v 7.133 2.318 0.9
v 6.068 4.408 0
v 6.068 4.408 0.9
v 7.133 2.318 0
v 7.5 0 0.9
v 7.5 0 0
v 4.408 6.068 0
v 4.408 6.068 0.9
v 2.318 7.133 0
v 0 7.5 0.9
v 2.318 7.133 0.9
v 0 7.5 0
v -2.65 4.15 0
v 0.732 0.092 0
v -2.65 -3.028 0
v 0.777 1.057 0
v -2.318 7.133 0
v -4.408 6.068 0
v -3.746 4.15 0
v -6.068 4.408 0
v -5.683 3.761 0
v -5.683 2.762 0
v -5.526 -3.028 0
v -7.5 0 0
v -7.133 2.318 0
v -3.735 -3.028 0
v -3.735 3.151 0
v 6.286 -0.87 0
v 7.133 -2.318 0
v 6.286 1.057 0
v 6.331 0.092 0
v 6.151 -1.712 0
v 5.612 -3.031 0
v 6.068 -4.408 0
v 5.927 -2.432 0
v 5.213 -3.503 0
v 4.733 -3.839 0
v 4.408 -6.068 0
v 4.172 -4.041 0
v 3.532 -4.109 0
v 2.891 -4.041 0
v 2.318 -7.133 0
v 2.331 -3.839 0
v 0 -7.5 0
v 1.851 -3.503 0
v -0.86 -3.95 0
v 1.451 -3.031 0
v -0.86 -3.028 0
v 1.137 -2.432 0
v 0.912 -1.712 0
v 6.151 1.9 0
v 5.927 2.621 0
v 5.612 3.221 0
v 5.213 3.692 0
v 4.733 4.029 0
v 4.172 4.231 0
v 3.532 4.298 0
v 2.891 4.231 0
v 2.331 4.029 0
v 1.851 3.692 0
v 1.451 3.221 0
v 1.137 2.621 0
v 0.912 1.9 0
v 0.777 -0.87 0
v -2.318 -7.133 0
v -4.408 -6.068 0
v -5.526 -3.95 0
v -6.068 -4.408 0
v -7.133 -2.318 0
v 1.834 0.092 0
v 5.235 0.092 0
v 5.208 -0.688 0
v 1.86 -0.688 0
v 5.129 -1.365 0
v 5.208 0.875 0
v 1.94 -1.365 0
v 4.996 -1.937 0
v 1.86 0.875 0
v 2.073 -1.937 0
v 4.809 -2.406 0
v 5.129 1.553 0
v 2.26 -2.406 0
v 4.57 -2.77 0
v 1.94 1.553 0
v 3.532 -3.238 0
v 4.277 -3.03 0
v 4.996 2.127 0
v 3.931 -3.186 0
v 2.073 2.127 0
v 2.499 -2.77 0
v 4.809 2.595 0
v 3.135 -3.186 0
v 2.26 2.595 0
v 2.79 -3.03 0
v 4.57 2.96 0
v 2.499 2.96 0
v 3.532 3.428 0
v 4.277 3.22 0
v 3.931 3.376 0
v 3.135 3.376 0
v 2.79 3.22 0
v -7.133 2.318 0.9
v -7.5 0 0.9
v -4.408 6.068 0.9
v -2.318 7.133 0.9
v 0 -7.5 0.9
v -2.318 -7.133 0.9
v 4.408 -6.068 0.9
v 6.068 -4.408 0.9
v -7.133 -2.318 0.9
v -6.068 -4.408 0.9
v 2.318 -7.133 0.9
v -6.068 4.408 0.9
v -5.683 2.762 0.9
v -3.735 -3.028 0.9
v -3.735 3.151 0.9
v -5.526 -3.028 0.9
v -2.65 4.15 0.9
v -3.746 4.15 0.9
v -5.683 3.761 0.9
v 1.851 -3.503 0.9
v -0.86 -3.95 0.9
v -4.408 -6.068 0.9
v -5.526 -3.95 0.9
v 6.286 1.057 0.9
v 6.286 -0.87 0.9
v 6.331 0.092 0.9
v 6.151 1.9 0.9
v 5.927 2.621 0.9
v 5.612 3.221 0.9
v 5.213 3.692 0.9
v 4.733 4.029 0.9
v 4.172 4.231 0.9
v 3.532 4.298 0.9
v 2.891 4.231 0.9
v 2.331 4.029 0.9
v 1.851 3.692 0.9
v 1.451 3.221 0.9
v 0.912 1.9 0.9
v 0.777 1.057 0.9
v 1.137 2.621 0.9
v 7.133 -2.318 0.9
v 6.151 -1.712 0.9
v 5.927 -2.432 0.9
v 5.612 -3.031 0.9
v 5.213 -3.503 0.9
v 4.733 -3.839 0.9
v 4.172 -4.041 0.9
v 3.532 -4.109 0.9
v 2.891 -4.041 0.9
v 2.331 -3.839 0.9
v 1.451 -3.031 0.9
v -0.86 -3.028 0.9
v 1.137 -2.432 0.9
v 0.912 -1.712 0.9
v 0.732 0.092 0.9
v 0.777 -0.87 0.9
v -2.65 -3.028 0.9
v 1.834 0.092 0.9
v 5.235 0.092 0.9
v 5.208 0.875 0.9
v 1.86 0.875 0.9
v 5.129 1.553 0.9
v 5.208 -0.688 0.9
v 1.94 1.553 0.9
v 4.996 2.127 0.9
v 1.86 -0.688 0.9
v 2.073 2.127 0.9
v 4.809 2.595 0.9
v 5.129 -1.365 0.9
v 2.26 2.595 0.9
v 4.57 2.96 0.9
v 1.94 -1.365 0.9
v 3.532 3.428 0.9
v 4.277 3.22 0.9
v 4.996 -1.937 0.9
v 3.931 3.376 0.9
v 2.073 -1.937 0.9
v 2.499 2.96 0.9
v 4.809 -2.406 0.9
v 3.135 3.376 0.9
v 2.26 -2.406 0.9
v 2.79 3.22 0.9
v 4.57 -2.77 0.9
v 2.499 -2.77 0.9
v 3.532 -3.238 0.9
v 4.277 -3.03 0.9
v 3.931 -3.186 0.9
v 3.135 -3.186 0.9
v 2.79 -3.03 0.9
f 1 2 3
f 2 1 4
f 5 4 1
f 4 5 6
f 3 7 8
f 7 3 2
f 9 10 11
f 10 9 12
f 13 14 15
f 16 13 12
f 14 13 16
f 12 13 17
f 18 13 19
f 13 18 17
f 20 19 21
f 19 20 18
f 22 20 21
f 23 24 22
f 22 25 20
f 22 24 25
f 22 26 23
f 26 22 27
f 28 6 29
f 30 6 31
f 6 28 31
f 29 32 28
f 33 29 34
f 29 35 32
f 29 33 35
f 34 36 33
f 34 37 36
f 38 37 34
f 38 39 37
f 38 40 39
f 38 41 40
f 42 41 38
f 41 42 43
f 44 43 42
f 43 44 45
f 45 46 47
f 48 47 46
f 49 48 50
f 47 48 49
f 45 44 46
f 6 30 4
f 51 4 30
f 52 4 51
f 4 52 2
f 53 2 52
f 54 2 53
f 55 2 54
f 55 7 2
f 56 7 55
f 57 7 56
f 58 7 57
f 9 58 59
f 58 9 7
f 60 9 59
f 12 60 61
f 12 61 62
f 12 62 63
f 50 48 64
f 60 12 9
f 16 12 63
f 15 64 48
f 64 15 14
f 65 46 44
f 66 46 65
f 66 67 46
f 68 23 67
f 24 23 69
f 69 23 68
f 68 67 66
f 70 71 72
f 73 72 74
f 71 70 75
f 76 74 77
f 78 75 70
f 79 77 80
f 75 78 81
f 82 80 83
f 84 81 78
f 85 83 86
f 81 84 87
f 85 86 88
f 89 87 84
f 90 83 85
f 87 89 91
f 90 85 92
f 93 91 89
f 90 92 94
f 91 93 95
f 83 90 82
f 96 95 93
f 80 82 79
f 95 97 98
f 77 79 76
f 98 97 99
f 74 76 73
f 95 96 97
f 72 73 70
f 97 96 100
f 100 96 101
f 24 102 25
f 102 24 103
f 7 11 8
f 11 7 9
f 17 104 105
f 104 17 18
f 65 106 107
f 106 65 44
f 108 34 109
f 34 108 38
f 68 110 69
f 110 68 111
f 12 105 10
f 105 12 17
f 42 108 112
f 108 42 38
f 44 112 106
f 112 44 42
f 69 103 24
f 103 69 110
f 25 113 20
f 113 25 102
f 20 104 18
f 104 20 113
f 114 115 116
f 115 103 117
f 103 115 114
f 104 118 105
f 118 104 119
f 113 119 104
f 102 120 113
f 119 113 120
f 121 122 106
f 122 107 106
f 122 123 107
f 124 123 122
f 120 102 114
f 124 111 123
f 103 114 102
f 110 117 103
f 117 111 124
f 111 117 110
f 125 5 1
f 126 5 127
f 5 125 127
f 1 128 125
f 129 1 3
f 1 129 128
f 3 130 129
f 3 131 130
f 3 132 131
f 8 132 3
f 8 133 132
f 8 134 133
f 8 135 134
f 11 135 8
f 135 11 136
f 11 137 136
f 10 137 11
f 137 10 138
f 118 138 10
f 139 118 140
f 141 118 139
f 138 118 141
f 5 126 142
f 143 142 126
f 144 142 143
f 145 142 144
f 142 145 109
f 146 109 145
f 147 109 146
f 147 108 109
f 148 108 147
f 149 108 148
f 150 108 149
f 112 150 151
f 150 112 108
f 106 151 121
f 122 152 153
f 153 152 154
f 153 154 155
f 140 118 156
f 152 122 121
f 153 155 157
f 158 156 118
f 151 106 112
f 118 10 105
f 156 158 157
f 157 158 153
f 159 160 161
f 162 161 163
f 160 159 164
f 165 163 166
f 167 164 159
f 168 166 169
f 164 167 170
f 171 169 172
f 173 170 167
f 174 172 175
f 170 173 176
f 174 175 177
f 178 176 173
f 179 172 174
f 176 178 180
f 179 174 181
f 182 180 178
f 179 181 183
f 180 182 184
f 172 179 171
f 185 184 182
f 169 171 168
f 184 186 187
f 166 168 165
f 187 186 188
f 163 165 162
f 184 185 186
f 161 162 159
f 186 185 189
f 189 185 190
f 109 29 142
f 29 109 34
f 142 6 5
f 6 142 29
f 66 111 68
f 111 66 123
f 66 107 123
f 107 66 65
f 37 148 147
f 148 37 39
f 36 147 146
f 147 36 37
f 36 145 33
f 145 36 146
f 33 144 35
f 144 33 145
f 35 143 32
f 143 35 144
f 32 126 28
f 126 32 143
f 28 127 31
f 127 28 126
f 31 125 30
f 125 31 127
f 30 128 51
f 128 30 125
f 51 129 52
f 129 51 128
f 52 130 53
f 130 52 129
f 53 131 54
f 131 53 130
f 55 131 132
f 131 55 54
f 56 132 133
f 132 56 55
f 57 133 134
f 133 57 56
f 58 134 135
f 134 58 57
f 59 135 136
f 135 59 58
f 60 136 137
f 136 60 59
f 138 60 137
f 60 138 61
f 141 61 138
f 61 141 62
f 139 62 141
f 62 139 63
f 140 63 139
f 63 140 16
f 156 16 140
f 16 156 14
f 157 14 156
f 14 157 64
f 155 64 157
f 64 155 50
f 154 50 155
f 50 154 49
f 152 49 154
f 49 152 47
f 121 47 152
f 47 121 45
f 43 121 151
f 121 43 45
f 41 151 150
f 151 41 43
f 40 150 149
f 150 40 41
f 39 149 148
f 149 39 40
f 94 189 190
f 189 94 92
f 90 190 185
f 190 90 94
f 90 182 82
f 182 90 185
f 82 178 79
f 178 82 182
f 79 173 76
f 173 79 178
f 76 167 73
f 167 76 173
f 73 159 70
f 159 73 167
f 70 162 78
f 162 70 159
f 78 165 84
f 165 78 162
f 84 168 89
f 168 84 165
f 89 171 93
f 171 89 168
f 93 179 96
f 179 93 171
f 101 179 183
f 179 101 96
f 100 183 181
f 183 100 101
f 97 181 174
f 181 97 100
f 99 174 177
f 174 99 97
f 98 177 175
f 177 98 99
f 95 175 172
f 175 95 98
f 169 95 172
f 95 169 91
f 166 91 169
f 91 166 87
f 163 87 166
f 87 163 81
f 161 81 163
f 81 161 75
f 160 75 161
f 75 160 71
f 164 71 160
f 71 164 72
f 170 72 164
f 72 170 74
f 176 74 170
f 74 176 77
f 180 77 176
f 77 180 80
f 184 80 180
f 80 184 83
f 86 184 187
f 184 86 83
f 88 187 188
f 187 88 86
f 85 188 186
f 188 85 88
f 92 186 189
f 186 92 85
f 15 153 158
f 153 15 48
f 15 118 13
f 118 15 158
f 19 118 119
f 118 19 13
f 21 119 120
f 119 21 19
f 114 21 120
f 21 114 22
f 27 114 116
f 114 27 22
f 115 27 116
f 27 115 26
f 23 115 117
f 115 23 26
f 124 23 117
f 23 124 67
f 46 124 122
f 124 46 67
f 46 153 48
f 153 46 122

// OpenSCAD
/****************************
 * Coin Customizer          *
 * 1.0                      *
 * Jan 2016                 *
 * Stafford Tyo             *
 * Standards Electronics    *
 ****************************
 */

/* [Text] */

//Use only one or two characters, this is not meant for words (too long for a coin)
text=10;

//Height of the text, adjust as necessary to fit it on the coin
text_height=8;

//Stencil Font to use
font="Allerta Stencil"; //[Allerta Stencil,Stardos Stencil,Sirin Stencil]

/* [Coin] */

//Total coin diameter, in mm
coin_diameter=15; //[5:40]

//Number of sides to the coin, the more there are the smoother the circle
coin_facets=20; //[6:100]

//Overall thickness of the coin, best used with a multiple of your extrude height)
coin_thickness=0.9; //[0.2:0.1:4]


// preview[view:south, tilt:top]

//Written by Stafford Tyo, Standards Electronics 2016

a=coin_diameter;
b=coin_facets;
c=text_height;
d=coin_thickness;
e=(str(text));
f=font;

difference() {

cylinder (h=d, d=a, $fn=b);

linear_extrude(height=d*4, center=true, convexity=10) {
text (text=e, font=f, halign="center", valign="center", size=c);

}
}
